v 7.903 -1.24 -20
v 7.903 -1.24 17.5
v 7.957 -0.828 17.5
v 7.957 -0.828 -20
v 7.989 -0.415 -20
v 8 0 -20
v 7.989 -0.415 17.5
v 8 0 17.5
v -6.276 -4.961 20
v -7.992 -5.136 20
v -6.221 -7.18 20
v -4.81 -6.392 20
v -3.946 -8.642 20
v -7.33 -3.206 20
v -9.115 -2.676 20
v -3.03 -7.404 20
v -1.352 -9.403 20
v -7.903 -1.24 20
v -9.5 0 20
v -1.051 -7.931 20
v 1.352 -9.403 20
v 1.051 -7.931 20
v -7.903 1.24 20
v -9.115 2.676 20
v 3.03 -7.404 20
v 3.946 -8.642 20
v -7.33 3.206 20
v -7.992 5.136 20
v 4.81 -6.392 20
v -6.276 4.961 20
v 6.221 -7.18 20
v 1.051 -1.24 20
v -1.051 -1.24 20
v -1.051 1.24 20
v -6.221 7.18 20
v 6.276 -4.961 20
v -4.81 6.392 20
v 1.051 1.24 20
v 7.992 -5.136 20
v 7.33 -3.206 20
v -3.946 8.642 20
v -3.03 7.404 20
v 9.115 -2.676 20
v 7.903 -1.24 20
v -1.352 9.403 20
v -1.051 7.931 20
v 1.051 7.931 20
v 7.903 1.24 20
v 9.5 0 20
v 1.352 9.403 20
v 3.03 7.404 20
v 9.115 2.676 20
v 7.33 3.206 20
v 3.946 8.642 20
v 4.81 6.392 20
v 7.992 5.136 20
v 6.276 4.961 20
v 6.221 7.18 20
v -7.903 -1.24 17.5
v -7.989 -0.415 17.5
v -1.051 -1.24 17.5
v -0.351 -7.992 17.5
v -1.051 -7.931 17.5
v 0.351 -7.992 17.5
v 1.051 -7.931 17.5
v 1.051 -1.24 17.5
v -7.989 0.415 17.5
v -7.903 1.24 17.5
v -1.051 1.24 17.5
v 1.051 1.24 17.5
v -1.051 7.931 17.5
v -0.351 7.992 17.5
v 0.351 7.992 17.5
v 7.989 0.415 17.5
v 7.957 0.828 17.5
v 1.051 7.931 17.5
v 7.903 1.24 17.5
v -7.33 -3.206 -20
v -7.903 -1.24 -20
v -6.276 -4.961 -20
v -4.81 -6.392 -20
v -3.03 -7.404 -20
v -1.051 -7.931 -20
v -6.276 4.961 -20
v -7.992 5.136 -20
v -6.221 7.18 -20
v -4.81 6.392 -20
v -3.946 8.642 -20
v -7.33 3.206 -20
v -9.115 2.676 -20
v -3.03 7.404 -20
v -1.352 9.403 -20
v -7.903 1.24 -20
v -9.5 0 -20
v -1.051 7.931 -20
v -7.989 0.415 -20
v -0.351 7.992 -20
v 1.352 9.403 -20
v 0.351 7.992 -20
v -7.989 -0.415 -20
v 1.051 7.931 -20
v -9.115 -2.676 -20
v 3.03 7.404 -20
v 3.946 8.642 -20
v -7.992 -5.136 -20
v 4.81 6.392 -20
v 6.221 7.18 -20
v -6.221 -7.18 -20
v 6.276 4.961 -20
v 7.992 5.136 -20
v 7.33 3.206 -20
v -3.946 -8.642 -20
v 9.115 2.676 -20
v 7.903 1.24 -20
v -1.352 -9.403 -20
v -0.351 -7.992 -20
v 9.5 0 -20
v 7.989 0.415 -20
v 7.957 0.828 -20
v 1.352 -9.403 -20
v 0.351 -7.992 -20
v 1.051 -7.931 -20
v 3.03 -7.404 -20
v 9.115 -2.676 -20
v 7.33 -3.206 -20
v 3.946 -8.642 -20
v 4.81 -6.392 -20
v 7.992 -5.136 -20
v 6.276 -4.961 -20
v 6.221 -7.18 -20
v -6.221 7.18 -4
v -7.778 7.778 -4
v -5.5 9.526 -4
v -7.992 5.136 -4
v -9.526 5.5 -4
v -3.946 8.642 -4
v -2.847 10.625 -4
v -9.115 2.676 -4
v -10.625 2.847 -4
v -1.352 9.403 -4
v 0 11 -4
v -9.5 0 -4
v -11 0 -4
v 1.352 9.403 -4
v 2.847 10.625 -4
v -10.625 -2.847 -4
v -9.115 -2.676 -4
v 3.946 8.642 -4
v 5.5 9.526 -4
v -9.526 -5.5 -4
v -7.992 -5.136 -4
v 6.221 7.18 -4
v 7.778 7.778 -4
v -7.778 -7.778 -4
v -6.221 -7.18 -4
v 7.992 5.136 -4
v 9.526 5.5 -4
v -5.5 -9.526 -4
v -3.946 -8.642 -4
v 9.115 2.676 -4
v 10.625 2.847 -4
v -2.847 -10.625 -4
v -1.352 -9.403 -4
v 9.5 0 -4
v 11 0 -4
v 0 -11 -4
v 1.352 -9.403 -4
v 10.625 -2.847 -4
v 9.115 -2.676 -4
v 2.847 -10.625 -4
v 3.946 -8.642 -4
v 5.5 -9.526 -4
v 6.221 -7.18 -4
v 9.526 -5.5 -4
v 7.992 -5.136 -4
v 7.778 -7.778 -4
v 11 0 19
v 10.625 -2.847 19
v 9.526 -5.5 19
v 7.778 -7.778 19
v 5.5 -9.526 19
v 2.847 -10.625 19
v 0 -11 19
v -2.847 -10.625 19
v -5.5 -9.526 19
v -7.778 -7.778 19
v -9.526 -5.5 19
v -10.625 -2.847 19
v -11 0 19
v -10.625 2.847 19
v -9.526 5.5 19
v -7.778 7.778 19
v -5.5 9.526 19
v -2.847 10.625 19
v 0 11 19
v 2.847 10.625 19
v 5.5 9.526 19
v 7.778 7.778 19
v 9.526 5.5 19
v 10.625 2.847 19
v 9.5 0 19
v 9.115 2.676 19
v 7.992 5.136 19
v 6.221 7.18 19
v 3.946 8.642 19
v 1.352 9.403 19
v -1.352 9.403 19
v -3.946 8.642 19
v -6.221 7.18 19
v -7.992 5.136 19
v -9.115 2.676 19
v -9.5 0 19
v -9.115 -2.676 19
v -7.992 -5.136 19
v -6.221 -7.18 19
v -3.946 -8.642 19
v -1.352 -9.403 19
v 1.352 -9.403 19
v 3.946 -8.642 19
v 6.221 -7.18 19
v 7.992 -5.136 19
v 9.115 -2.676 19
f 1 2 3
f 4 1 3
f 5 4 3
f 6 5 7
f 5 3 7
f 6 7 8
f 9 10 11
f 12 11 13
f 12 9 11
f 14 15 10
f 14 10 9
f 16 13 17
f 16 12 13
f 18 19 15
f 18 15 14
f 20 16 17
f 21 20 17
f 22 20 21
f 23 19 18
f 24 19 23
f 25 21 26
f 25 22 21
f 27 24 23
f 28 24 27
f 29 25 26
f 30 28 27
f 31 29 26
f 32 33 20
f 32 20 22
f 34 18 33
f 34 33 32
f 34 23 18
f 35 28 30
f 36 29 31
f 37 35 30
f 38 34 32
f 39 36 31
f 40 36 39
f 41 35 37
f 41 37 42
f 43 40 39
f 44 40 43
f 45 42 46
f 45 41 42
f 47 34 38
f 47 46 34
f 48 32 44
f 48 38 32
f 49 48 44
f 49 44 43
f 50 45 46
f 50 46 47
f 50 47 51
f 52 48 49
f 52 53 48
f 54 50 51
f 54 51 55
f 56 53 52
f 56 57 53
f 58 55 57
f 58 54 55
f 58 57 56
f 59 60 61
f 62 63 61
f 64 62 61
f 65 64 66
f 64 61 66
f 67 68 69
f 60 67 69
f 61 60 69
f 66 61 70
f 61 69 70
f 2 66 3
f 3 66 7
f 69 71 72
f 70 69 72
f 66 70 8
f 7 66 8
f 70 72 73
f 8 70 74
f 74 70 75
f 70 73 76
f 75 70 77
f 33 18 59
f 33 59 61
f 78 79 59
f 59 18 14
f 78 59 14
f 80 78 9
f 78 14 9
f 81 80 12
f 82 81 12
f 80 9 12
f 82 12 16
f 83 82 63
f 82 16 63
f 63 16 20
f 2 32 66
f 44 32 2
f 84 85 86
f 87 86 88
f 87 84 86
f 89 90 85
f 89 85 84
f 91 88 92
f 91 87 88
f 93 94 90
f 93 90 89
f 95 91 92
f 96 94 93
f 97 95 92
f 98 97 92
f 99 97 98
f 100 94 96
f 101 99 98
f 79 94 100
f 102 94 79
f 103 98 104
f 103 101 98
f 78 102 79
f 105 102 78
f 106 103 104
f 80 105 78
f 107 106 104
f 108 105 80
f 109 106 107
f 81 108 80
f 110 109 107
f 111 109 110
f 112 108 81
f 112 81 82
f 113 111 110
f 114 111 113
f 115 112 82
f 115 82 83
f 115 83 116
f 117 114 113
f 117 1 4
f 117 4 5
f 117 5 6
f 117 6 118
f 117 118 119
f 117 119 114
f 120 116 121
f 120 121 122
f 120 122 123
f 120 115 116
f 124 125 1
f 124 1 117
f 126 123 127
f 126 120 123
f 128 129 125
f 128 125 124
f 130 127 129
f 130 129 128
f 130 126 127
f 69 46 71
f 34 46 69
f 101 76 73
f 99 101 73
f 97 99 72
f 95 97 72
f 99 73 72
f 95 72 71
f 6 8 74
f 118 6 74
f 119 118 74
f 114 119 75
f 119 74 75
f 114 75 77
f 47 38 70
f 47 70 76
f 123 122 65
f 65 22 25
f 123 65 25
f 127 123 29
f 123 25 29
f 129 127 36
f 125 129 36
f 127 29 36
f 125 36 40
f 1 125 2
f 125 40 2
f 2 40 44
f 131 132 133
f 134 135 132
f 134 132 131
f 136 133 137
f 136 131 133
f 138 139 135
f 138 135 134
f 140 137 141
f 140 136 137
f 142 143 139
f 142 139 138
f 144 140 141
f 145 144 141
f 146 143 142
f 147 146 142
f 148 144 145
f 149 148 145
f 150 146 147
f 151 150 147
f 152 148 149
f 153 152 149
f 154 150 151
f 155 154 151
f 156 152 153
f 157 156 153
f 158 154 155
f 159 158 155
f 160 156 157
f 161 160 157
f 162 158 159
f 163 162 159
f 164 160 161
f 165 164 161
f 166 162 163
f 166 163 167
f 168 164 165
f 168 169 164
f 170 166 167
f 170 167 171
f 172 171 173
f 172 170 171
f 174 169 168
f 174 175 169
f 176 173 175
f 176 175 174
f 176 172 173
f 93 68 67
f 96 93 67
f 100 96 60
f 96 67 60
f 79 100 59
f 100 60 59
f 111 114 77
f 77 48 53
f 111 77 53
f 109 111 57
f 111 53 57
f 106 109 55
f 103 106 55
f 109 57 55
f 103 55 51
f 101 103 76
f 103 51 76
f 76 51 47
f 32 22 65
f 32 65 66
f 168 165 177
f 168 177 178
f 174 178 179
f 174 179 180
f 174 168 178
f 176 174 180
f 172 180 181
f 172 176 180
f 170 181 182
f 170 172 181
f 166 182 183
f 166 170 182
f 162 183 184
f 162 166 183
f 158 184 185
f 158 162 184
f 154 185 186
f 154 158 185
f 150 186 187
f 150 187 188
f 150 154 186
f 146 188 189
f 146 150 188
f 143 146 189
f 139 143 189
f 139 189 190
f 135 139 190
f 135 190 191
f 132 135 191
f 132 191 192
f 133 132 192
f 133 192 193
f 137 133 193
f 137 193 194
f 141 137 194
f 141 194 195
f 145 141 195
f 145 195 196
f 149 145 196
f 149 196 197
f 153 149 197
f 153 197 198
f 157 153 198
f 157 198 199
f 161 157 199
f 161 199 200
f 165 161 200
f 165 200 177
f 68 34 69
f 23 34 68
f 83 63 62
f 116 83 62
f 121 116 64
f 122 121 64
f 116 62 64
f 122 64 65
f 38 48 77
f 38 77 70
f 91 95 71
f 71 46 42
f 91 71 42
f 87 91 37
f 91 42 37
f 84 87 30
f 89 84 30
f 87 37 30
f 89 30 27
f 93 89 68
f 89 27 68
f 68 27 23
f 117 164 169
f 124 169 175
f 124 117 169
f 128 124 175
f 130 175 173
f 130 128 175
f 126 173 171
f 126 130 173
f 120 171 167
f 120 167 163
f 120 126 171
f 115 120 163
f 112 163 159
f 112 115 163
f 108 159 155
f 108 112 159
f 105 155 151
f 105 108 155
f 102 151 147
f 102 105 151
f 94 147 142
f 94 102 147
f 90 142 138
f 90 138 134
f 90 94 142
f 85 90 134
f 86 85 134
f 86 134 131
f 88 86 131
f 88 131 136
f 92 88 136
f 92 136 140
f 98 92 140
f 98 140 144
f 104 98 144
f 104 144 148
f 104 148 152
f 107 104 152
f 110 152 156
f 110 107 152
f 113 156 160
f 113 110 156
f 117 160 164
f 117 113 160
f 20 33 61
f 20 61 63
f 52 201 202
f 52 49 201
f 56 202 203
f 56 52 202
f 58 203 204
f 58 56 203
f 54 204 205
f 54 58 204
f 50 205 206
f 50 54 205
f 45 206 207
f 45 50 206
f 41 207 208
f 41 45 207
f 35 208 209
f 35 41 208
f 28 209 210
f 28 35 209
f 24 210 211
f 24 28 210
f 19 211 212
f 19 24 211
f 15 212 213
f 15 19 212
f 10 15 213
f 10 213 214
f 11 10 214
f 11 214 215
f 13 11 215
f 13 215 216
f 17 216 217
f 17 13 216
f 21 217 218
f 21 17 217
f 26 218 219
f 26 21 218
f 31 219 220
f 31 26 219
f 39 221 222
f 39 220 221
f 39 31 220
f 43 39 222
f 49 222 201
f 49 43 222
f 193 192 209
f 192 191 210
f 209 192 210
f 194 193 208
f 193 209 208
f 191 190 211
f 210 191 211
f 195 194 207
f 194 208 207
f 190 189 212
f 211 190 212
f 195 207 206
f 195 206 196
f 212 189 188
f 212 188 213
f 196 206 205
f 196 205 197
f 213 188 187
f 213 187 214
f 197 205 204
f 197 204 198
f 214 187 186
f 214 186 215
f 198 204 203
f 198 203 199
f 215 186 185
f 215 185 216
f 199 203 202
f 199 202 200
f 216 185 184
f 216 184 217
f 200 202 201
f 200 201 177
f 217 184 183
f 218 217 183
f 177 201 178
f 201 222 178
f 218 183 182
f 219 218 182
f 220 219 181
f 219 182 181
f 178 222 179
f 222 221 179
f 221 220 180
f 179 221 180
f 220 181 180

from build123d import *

# Parameters (mm, degrees)
F0_R      = 9.5
F1_DEPTH  = 20
F3_DEPTH  = 50
F5_DEPTH  = 50
F7_DEPTH  = 2.5
F8_R      = 11
F8_R_2    = 9.5
F9_DEPTH  = 39
F10_R     = 11
F10_R_2   = 9.5
F11_DEPTH = 16


with BuildPart() as f1:
    # F0 (on Top) → F1 (new body, symmetric)
    with BuildSketch(Plane.XY):
        Circle(F0_R)
    extrude(amount=F1_DEPTH, both=True)

    # F2 (on face) → F3 (cut)
    with BuildSketch(Plane.XY.offset(20)):
        with BuildLine():
            Line((-1.0508030978, 1.2395313024), (-1.0508030978, 7.9306880439))
            ThreePointArc((-1.0508030978, 7.9306880439), (-5.5890325577, 5.7238723841), (-7.9033892825, 1.2395313024))
            Line((-7.9033892825, 1.2395313024), (-1.0508030978, 1.2395313024))
        make_face()
        with BuildLine():
            Line((1.0508030978, 1.2395313024), (7.9033892825, 1.2395313024))
            ThreePointArc((7.9033892825, 1.2395313024), (5.5890325577, 5.7238723841), (1.0508030978, 7.9306880439))
            Line((1.0508030978, 7.9306880439), (1.0508030978, 1.2395313024))
        make_face()
        with BuildLine():
            ThreePointArc((1.0508030978, -7.9306880439), (5.5890325577, -5.7238723841), (7.9033892825, -1.2395313024))
            Line((7.9033892825, -1.2395313024), (1.0508030978, -1.2395313024))
            Line((1.0508030978, -1.2395313024), (1.0508030978, -7.9306880439))
        make_face()
        with BuildLine():
            ThreePointArc((-7.9033892825, -1.2395313024), (-5.5890325577, -5.7238723841), (-1.0508030978, -7.9306880439))
            Line((-1.0508030978, -7.9306880439), (-1.0508030978, -1.2395313024))
            Line((-1.0508030978, -1.2395313024), (-7.9033892825, -1.2395313024))
        make_face()
    extrude(amount=-F3_DEPTH, mode=Mode.SUBTRACT)

    # F4 (on face) + F2 (on face) → F5 (cut)
    with BuildSketch(Plane.XY.offset(20)):
        with BuildLine():
            Line((-7.9033892825, 1.2395313024), (-1.0508030978, 1.2395313024))
            Line((-1.0508030978, 1.2395313024), (-1.0508030978, 7.9306880439))
            ThreePointArc((-1.0508030978, 7.9306880439), (-5.5890325577, 5.7238723841), (-7.9033892825, 1.2395313024))
        make_face()
        with BuildLine():
            ThreePointArc((-1.0508030978, -1.2395313024), (-1.625, 0), (-1.0508030978, 1.2395313024))
            Line((-1.0508030978, 1.2395313024), (-7.9033892825, 1.2395313024))
            ThreePointArc((-7.9033892825, 1.2395313024), (-8, 0), (-7.9033892825, -1.2395313024))
            Line((-7.9033892825, -1.2395313024), (-1.0508030978, -1.2395313024))
        make_face()
        with BuildLine():
            Line((-1.0508030978, 7.9306880439), (-1.0508030978, 1.2395313024))
            ThreePointArc((-1.0508030978, 1.2395313024), (0, 1.625), (1.0508030978, 1.2395313024))
            Line((1.0508030978, 1.2395313024), (1.0508030978, 7.9306880439))
            ThreePointArc((1.0508030978, 7.9306880439), (0, 8), (-1.0508030978, 7.9306880439))
        make_face()
        with BuildLine():
            Line((1.0508030978, 7.9306880439), (1.0508030978, 1.2395313024))
            Line((1.0508030978, 1.2395313024), (7.9033892825, 1.2395313024))
            ThreePointArc((7.9033892825, 1.2395313024), (5.5890325577, 5.7238723841), (1.0508030978, 7.9306880439))
        make_face()
        with BuildLine():
            Line((7.9033892825, 1.2395313024), (1.0508030978, 1.2395313024))
            ThreePointArc((1.0508030978, 1.2395313024), (1.474479575, 0.6830336617), (1.625, 0))
            ThreePointArc((1.625, 0), (1.474479575, -0.6830336617), (1.0508030978, -1.2395313024))
            Line((1.0508030978, -1.2395313024), (7.9033892825, -1.2395313024))
            ThreePointArc((7.9033892825, -1.2395313024), (7.9758107506, -0.6216452928), (8, 0))
            ThreePointArc((8, 0), (7.9758107506, 0.6216452928), (7.9033892825, 1.2395313024))
        make_face()
        with BuildLine():
            ThreePointArc((1.0508030978, -1.2395313024), (0, -1.625), (-1.0508030978, -1.2395313024))
            Line((-1.0508030978, -1.2395313024), (-1.0508030978, -7.9306880439))
            ThreePointArc((-1.0508030978, -7.9306880439), (0, -8), (1.0508030978, -7.9306880439))
            Line((1.0508030978, -7.9306880439), (1.0508030978, -1.2395313024))
        make_face()
        with BuildLine():
            Line((-1.0508030978, -7.9306880439), (-1.0508030978, -1.2395313024))
            Line((-1.0508030978, -1.2395313024), (-7.9033892825, -1.2395313024))
            ThreePointArc((-7.9033892825, -1.2395313024), (-5.5890325577, -5.7238723841), (-1.0508030978, -7.9306880439))
        make_face()
        with BuildLine():
            Line((7.9033892825, -1.2395313024), (1.0508030978, -1.2395313024))
            Line((1.0508030978, -1.2395313024), (1.0508030978, -7.9306880439))
            ThreePointArc((1.0508030978, -7.9306880439), (5.5890325577, -5.7238723841), (7.9033892825, -1.2395313024))
        make_face()
    with BuildSketch(Plane.XY.offset(20)):
        with BuildLine():
            ThreePointArc((1.625, 0), (1.474479575, 0.6830336617), (1.0508030978, 1.2395313024))
            ThreePointArc((1.0508030978, 1.2395313024), (0, 1.625), (-1.0508030978, 1.2395313024))
            ThreePointArc((-1.0508030978, 1.2395313024), (-1.625, 0), (-1.0508030978, -1.2395313024))
            ThreePointArc((-1.0508030978, -1.2395313024), (0, -1.625), (1.0508030978, -1.2395313024))
            ThreePointArc((1.0508030978, -1.2395313024), (1.474479575, -0.6830336617), (1.625, 0))
        make_face()
    extrude(amount=-F5_DEPTH, mode=Mode.SUBTRACT)

    # F6 (on face) → F7 (join)
    with BuildSketch(Plane.XY.offset(20)):
        with BuildLine():
            ThreePointArc((-1.0508030978, -1.2395313024), (-1.625, 0), (-1.0508030978, 1.2395313024))
            Line((-1.0508030978, 1.2395313024), (-7.9033892825, 1.2395313024))
            ThreePointArc((-7.9033892825, 1.2395313024), (-8, 0), (-7.9033892825, -1.2395313024))
            Line((-7.9033892825, -1.2395313024), (-1.0508030978, -1.2395313024))
        make_face()
        with BuildLine():
            Line((-1.0508030978, 7.9306880439), (-1.0508030978, 1.2395313024))
            ThreePointArc((-1.0508030978, 1.2395313024), (0, 1.625), (1.0508030978, 1.2395313024))
            Line((1.0508030978, 1.2395313024), (1.0508030978, 7.9306880439))
            ThreePointArc((1.0508030978, 7.9306880439), (0, 8), (-1.0508030978, 7.9306880439))
        make_face()
        with BuildLine():
            ThreePointArc((1.0508030978, 1.2395313024), (0, 1.625), (-1.0508030978, 1.2395313024))
            ThreePointArc((-1.0508030978, 1.2395313024), (-1.625, 0), (-1.0508030978, -1.2395313024))
            ThreePointArc((-1.0508030978, -1.2395313024), (0, -1.625), (1.0508030978, -1.2395313024))
            ThreePointArc((1.0508030978, -1.2395313024), (1.474479575, -0.6830336617), (1.625, 0))
            ThreePointArc((1.625, 0), (1.474479575, 0.6830336617), (1.0508030978, 1.2395313024))
        make_face()
        with BuildLine():
            Line((7.9033892825, 1.2395313024), (1.0508030978, 1.2395313024))
            ThreePointArc((1.0508030978, 1.2395313024), (1.474479575, 0.6830336617), (1.625, 0))
            ThreePointArc((1.625, 0), (1.474479575, -0.6830336617), (1.0508030978, -1.2395313024))
            Line((1.0508030978, -1.2395313024), (7.9033892825, -1.2395313024))
            ThreePointArc((7.9033892825, -1.2395313024), (8, 0), (7.9033892825, 1.2395313024))
        make_face()
        with BuildLine():
            ThreePointArc((1.0508030978, -1.2395313024), (0, -1.625), (-1.0508030978, -1.2395313024))
            Line((-1.0508030978, -1.2395313024), (-1.0508030978, -7.9306880439))
            ThreePointArc((-1.0508030978, -7.9306880439), (0, -8), (1.0508030978, -7.9306880439))
            Line((1.0508030978, -7.9306880439), (1.0508030978, -1.2395313024))
        make_face()
    extrude(amount=-F7_DEPTH)

    # F8 (on face) → F9 (join)
    with BuildSketch(Plane(origin=(0, 0, -20), x_dir=(1, 0, 0), z_dir=(0, 0, -1))):
        Circle(F8_R)
        Circle(F8_R_2, mode=Mode.SUBTRACT)
    extrude(amount=-F9_DEPTH)

    # F10 (on face) → F11 (cut)
    with BuildSketch(Plane(origin=(0, 0, -20), x_dir=(1, 0, 0), z_dir=(0, 0, -1))):
        Circle(F10_R)
        Circle(F10_R_2, mode=Mode.SUBTRACT)
    extrude(amount=-F11_DEPTH, mode=Mode.SUBTRACT)


solid = f1.part
